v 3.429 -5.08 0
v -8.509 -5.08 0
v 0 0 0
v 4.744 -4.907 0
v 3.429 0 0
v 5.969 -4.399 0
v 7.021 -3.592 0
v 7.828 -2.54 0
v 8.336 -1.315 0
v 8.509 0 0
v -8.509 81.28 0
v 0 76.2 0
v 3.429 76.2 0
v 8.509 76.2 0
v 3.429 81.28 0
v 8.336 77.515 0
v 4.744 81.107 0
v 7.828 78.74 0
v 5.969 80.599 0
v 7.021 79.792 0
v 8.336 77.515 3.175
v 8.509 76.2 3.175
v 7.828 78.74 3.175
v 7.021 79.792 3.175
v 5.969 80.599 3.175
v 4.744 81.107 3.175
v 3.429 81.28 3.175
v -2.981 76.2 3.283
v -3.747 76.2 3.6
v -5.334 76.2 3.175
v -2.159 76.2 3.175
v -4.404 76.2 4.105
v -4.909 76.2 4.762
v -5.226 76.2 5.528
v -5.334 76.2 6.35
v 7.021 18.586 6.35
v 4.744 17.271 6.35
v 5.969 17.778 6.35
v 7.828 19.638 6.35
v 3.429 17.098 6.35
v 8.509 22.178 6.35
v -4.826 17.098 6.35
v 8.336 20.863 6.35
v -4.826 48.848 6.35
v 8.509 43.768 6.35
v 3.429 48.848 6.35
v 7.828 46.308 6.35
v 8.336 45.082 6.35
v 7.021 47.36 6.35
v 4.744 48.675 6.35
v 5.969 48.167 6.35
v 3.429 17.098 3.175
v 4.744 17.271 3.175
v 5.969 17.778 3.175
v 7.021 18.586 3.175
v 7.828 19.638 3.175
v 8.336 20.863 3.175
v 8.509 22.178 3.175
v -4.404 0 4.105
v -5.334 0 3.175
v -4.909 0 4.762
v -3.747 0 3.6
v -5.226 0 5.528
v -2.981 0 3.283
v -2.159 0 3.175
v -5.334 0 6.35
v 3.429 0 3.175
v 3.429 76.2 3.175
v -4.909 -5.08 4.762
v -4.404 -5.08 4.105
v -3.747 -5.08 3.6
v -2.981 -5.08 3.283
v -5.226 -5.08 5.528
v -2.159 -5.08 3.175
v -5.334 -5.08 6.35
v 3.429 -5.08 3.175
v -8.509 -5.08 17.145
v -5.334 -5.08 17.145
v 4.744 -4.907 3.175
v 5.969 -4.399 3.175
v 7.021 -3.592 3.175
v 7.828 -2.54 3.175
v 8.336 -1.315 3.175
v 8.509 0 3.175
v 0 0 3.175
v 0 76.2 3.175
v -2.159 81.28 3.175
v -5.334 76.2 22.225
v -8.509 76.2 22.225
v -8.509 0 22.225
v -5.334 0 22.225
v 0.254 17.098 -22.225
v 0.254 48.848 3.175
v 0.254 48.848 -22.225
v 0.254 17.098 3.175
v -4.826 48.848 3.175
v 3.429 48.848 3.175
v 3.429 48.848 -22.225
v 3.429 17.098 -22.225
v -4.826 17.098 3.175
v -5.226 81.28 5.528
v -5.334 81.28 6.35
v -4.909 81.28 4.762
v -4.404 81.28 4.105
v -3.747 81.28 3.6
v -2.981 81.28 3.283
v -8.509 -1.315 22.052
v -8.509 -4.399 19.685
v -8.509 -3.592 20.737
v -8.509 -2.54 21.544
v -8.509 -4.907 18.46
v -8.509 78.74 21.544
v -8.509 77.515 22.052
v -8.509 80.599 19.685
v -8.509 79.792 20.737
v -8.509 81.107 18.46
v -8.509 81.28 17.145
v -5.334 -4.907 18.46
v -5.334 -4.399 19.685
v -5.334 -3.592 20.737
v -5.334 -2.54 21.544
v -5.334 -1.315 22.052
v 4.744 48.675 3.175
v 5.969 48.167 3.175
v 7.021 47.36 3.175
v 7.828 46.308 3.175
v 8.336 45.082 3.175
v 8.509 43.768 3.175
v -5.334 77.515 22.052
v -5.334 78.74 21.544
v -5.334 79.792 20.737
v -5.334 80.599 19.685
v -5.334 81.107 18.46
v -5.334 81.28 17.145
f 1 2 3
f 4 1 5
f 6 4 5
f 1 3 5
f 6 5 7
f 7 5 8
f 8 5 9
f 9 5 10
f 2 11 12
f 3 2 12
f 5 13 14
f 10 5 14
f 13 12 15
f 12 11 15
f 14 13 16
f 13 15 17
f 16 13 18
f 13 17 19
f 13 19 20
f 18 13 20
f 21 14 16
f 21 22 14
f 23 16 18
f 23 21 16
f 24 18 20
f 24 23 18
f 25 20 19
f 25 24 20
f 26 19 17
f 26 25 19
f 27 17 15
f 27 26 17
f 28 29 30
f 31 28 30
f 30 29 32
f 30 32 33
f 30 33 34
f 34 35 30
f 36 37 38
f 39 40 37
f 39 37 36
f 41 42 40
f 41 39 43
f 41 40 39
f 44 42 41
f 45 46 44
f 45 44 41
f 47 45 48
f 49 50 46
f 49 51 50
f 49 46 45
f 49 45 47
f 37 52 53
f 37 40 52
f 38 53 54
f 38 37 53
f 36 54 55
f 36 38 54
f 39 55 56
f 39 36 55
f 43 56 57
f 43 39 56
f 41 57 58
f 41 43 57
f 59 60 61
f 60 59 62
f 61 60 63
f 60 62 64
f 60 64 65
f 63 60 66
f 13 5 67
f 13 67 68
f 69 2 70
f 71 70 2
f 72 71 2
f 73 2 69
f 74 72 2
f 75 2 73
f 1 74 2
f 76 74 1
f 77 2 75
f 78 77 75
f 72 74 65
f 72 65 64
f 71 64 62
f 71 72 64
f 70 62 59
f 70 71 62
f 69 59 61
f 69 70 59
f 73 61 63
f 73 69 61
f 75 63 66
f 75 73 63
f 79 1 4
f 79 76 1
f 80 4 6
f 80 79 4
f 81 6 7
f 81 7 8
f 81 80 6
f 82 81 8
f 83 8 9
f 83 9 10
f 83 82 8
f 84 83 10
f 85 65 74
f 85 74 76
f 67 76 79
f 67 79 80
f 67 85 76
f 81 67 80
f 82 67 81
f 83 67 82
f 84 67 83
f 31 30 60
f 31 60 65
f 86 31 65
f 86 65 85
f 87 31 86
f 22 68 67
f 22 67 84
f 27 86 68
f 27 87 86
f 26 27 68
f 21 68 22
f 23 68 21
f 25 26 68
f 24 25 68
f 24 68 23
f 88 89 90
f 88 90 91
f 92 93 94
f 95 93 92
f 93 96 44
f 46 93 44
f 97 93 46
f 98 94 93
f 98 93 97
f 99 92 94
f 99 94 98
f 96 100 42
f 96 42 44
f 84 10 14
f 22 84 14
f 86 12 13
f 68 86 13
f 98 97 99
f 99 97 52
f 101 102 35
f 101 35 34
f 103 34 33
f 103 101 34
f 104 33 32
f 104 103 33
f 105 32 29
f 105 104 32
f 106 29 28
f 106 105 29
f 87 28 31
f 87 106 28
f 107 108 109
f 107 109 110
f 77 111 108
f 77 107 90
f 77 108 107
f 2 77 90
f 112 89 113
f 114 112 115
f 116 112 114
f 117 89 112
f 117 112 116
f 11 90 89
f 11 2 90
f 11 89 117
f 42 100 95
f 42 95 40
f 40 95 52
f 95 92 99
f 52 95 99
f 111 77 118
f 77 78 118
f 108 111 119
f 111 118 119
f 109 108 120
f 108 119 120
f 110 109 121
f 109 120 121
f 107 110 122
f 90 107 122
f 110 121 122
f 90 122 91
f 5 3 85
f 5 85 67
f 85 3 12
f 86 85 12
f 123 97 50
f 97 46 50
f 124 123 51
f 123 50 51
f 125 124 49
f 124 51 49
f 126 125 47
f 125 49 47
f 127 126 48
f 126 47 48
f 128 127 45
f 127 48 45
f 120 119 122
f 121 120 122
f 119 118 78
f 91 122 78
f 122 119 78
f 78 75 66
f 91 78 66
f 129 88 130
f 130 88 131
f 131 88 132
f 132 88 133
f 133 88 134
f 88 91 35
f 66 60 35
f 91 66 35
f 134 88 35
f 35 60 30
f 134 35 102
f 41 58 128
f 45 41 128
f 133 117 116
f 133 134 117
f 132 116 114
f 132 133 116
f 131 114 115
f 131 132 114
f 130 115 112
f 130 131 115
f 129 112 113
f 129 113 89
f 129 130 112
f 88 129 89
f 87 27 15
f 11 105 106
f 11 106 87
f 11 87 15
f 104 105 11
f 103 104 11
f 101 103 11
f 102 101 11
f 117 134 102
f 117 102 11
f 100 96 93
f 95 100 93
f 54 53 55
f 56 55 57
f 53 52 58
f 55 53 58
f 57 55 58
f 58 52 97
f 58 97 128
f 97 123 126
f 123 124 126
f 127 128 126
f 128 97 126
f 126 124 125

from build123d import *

# Parameters (mm, degrees)
F0_W      = 17.018
F0_H      = 86.36
F0_W_2    = 3.429
F0_H_2    = 76.2
F1_DEPTH  = 3.175
F2_W      = 3.175
F2_H      = 86.36
F3_DEPTH  = 19.05
F4_W      = 13.335
F4_H      = 31.75
F5_DEPTH  = 3.175
F6_W      = 3.175
F6_H      = 31.75
F7_DEPTH  = 25.4
F8_R      = 5.08
F8_2_R    = 5.08
F11_DEPTH = 5.08
F12_DEPTH = 5.08


with BuildPart() as f1:
    # F0 (on Top) → F1 (new body)
    with BuildSketch(Plane.XY):
        with Locations((0, 38.1)):
            Rectangle(F0_W, F0_H)
        with Locations((1.7145, 38.1)):
            Rectangle(F0_W_2, F0_H_2, mode=Mode.SUBTRACT)
    extrude(amount=F1_DEPTH)

    # F2 (on face) → F3 (join)
    with BuildSketch(Plane.XY.offset(3.175)):
        with Locations((-6.9215, 38.1)):
            Rectangle(F2_W, F2_H)
    extrude(amount=F3_DEPTH)

    # F8#2
    f8_2_edges = [f1.edges().sort_by_distance(p)[0] for p in [
        (8.509, -5.08, 1.5875),
        (8.509, 81.28, 1.5875),
        (-6.9215, -5.08, 22.225),
        (-6.9215, 81.28, 22.225),
    ]]
    fillet(f8_2_edges, radius=F8_2_R)

    # F9 (on face) → F11 (join, through all)
    with BuildSketch(Plane.XZ.offset(5.08)):
        with BuildLine():
            Line((-5.334, 6.35), (-5.334, 3.175))
            Line((-5.334, 3.175), (-2.159, 3.175))
            ThreePointArc((-2.159, 3.175), (-4.4040640303, 4.1049359697), (-5.334, 6.35))
        make_face()
    extrude(amount=-F11_DEPTH)

    # F10 (on face) → F12 (join, through all)
    with BuildSketch(Plane(origin=(0, 81.28, 0), x_dir=(-1, 0, 0), z_dir=(0, 1, 0))):
        with BuildLine():
            Line((5.334, 3.175), (5.334, 6.35))
            ThreePointArc((5.334, 6.35), (4.4040640303, 4.1049359697), (2.159, 3.175))
            Line((2.159, 3.175), (5.334, 3.175))
        make_face()
    extrude(amount=-F12_DEPTH)


with BuildPart() as f5:
    # F4 (on face) → F5 (new body)
    with BuildSketch(Plane.XY.offset(3.175)):
        with Locations((1.8415, 32.9726202935)):
            Rectangle(F4_W, F4_H)
    extrude(amount=F5_DEPTH)

    # F6 (on face) → F7 (join)
    with BuildSketch(Plane(origin=(0, 0, 3.175), x_dir=(1, 0, 0), z_dir=(0, 0, -1))):
        with Locations((1.8415, -32.9726202935)):
            Rectangle(F6_W, F6_H)
    extrude(amount=F7_DEPTH)

    # F8
    f8_edges = [f5.edges().sort_by_distance(p)[0] for p in [
        (8.509, 17.09762, 4.7625),
        (8.509, 48.84762, 4.7625),
    ]]
    fillet(f8_edges, radius=F8_R)


solid = Compound([f1.part, f5.part])
